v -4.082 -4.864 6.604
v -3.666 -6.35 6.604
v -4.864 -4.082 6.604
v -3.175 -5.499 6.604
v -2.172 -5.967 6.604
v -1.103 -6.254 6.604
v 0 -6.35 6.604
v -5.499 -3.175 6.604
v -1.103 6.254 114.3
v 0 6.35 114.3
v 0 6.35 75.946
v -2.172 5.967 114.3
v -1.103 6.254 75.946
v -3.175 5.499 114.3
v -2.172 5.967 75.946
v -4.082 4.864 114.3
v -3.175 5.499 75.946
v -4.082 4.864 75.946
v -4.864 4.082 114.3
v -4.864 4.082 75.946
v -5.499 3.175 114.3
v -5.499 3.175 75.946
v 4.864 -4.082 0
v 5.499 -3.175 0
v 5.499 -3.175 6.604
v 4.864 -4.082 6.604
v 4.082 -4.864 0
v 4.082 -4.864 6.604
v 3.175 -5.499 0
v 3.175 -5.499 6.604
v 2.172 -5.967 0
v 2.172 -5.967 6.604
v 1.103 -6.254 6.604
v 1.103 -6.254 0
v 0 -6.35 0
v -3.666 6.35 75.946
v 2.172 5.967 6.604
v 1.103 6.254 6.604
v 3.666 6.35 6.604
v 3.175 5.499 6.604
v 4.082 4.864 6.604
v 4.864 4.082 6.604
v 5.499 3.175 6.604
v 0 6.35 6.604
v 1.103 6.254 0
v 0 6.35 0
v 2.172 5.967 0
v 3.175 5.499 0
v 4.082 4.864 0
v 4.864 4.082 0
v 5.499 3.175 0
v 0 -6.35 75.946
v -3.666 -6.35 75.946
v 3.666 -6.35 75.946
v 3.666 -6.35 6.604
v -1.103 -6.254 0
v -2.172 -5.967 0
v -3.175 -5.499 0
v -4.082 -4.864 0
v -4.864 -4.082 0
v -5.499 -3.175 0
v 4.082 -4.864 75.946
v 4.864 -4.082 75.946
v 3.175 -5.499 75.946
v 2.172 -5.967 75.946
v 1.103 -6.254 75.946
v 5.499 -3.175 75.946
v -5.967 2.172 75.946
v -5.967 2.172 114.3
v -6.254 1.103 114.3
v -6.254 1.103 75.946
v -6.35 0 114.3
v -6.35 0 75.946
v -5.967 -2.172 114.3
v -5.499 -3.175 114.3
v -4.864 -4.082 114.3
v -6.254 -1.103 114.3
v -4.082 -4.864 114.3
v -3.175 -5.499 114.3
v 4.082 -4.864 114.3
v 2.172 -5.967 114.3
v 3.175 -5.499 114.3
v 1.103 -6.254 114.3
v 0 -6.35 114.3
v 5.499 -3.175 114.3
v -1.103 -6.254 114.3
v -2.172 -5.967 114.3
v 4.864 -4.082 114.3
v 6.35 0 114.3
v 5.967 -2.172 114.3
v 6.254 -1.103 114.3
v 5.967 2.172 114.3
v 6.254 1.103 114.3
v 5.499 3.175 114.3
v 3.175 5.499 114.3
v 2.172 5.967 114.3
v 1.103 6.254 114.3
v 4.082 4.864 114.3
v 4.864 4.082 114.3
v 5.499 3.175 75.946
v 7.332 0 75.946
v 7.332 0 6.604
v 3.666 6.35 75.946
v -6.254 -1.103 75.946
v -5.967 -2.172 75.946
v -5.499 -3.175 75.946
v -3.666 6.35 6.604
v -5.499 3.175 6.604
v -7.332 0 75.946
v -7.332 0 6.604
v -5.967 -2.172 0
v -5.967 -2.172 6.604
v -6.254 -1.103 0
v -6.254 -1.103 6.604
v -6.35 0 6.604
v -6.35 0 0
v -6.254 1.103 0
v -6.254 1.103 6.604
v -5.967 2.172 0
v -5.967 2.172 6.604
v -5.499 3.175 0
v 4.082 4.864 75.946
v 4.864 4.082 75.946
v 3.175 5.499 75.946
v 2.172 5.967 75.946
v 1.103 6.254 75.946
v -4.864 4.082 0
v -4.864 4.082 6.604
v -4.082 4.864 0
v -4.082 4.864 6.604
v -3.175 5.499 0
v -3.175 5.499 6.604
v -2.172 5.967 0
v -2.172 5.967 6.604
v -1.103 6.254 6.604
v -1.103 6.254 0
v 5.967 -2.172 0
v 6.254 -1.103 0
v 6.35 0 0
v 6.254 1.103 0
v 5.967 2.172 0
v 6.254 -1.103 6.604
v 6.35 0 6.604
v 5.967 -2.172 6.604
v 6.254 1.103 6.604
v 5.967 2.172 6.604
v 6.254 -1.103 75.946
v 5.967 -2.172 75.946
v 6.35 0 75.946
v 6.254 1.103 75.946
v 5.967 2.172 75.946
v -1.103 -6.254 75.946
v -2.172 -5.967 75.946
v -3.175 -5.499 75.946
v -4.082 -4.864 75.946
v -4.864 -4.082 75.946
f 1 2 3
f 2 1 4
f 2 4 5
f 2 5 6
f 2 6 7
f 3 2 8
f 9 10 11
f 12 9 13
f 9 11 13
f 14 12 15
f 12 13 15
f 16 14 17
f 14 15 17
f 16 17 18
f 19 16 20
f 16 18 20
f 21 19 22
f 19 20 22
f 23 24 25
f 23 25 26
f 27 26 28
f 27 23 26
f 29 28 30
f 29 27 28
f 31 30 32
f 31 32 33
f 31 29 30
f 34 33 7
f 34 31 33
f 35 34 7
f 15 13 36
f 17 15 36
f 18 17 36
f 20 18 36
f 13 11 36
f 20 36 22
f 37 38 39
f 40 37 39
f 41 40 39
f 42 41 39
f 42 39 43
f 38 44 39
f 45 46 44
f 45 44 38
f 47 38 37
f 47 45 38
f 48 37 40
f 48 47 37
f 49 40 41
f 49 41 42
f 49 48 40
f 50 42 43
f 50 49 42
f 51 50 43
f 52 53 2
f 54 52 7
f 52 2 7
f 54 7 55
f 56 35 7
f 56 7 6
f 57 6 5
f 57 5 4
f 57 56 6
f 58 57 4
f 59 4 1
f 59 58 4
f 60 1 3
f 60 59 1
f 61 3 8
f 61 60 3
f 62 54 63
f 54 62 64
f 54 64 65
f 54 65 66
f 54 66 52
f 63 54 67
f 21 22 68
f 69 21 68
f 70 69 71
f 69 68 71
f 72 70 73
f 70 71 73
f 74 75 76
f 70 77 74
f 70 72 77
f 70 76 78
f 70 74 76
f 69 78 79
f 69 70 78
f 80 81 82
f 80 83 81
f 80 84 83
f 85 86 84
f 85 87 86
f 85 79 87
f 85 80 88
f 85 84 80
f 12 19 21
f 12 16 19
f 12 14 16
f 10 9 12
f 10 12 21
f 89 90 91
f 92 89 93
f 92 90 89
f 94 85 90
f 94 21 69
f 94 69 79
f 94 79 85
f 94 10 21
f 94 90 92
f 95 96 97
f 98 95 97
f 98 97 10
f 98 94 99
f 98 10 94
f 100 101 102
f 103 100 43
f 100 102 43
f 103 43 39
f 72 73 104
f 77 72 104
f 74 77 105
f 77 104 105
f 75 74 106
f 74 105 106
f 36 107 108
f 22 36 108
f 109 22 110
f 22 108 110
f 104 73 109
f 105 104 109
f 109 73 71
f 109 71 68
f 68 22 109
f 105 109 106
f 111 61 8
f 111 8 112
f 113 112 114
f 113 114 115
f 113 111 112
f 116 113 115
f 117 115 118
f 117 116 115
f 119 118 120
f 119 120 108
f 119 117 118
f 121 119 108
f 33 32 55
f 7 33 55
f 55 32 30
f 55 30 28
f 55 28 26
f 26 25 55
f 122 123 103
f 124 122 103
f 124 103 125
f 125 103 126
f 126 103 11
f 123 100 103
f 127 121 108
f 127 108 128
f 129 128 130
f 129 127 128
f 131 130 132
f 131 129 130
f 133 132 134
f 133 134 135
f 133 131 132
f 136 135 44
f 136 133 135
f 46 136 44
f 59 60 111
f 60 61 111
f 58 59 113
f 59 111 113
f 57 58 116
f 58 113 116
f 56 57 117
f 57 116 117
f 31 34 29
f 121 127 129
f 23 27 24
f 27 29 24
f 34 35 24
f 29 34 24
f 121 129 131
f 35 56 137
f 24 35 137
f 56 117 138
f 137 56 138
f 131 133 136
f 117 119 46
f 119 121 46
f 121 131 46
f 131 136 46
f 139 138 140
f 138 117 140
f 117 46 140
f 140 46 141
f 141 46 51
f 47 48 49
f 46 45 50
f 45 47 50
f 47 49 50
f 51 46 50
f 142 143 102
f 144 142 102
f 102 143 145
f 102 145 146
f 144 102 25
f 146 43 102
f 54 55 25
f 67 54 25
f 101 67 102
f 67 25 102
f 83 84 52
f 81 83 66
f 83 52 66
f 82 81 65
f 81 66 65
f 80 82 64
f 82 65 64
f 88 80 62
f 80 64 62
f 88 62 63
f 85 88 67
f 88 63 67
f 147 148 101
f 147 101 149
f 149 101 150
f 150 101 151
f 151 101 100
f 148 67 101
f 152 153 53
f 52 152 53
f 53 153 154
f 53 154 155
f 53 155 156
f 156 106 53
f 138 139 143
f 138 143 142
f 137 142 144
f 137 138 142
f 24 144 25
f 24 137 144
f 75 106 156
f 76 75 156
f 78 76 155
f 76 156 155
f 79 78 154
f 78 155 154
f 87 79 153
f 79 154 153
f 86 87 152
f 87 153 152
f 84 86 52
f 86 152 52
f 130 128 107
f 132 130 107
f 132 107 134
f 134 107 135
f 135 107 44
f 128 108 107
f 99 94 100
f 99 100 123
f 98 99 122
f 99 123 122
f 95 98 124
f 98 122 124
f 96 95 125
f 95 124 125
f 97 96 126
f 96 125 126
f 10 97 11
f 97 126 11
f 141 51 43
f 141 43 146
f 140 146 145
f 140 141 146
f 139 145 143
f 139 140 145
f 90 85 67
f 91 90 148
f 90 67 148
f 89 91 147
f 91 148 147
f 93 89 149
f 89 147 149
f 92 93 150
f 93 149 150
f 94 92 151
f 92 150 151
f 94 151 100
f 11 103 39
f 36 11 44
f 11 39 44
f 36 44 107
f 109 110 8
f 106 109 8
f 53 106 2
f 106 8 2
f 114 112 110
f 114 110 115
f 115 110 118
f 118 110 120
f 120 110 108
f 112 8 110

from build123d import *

# Parameters (mm, degrees)
BOSS_EXTRUDE1_DEPTH = 114.3
CUT_EXTRUDE1_DEPTH  = 6.604
CUT_EXTRUDE3_DEPTH  = 77.562920199


with BuildPart() as part:
    # Sketch1 → Boss-Extrude1 (new body)
    with BuildSketch(Plane.XY):
        Polygon((7.332348419, 0), (3.666174209, 6.35), (-3.666174209, 6.35), (-7.332348419, 0), (-3.666174209, -6.35), (3.666174209, -6.35), align=None)
    extrude(amount=BOSS_EXTRUDE1_DEPTH)

    # Sketch1<3> → Cut-Extrude1 (cut)
    with BuildSketch(Plane.XY):
        with BuildLine():
            Line((5.499261261, -3.175000092), (7.332348419, 0))
            Line((7.332348419, 0), (5.499261261, 3.175000092))
            ThreePointArc((5.499261261, 3.175000092), (6.35, 0), (5.499261261, -3.175000092))
        make_face()
        with BuildLine():
            ThreePointArc((0, 6.35), (3.174999954, 5.499261341), (5.499261261, 3.175000092))
            Line((5.499261261, 3.175000092), (3.666174209, 6.35))
            Line((3.666174209, 6.35), (0, 6.35))
        make_face()
        with BuildLine():
            Line((3.666174209, -6.35), (5.499261261, -3.175000092))
            ThreePointArc((5.499261261, -3.175000092), (3.174999954, -5.499261341), (0, -6.35))
            Line((0, -6.35), (3.666174209, -6.35))
        make_face()
        with BuildLine():
            ThreePointArc((-5.499261261, 3.175000092), (-3.174999954, 5.499261341), (0, 6.35))
            Line((0, 6.35), (-3.666174209, 6.35))
            Line((-3.666174209, 6.35), (-5.499261261, 3.175000092))
        make_face()
        with BuildLine():
            Line((-3.666174209, -6.35), (0, -6.35))
            ThreePointArc((0, -6.35), (-3.175000002, -5.499261313), (-5.499261317, -3.174999996))
            Line((-5.499261317, -3.174999996), (-3.666174209, -6.35))
        make_face()
        with BuildLine():
            ThreePointArc((-5.499261317, -3.174999996), (-6.35, 5.6e-08), (-5.499261261, 3.175000092))
            Line((-5.499261261, 3.175000092), (-7.332348419, 0))
            Line((-7.332348419, 0), (-5.499261317, -3.174999996))
        make_face()
    extrude(amount=CUT_EXTRUDE1_DEPTH, mode=Mode.SUBTRACT)

    # Sketch3 → Cut-Extrude3 (cut, through all)
    with BuildSketch(Plane(origin=(0, 0, 75.946), x_dir=(-1, 0, 0), z_dir=(0, 0, -1))):
        with BuildLine():
            Line((0, 6.35), (-3.666174209, 6.35))
            Line((-3.666174209, 6.35), (-5.499261441, 3.17499978))
            ThreePointArc((-5.499261441, 3.17499978), (-3.17500011, 5.499261251), (0, 6.35))
        make_face()
        with BuildLine():
            ThreePointArc((-5.499261441, -3.17499978), (-6.35, 0), (-5.499261441, 3.17499978))
            Line((-5.499261441, 3.17499978), (-7.332348419, 0))
            Line((-7.332348419, 0), (-5.499261441, -3.17499978))
        make_face()
        with BuildLine():
            Line((3.666174209, 6.35), (0, 6.35))
            ThreePointArc((0, 6.35), (3.175000128, 5.49926124), (5.499261462, 3.174999743))
            Line((5.499261462, 3.174999743), (3.666174209, 6.35))
        make_face()
        with BuildLine():
            ThreePointArc((0, -6.35), (-3.17500011, -5.499261251), (-5.499261441, -3.17499978))
            Line((-5.499261441, -3.17499978), (-3.666174209, -6.35))
            Line((-3.666174209, -6.35), (0, -6.35))
        make_face()
        with BuildLine():
            Line((7.332348419, 0), (5.499261462, 3.174999743))
            ThreePointArc((5.499261462, 3.174999743), (6.35, -2.95e-07), (5.499261168, -3.175000253))
            Line((5.499261168, -3.175000253), (7.332348419, 0))
        make_face()
        with BuildLine():
            ThreePointArc((5.499261168, -3.175000253), (3.174999873, -5.499261387), (0, -6.35))
            Line((0, -6.35), (3.666174209, -6.35))
            Line((3.666174209, -6.35), (5.499261168, -3.175000253))
        make_face()
    extrude(amount=-CUT_EXTRUDE3_DEPTH, mode=Mode.SUBTRACT)


solid = part.part
